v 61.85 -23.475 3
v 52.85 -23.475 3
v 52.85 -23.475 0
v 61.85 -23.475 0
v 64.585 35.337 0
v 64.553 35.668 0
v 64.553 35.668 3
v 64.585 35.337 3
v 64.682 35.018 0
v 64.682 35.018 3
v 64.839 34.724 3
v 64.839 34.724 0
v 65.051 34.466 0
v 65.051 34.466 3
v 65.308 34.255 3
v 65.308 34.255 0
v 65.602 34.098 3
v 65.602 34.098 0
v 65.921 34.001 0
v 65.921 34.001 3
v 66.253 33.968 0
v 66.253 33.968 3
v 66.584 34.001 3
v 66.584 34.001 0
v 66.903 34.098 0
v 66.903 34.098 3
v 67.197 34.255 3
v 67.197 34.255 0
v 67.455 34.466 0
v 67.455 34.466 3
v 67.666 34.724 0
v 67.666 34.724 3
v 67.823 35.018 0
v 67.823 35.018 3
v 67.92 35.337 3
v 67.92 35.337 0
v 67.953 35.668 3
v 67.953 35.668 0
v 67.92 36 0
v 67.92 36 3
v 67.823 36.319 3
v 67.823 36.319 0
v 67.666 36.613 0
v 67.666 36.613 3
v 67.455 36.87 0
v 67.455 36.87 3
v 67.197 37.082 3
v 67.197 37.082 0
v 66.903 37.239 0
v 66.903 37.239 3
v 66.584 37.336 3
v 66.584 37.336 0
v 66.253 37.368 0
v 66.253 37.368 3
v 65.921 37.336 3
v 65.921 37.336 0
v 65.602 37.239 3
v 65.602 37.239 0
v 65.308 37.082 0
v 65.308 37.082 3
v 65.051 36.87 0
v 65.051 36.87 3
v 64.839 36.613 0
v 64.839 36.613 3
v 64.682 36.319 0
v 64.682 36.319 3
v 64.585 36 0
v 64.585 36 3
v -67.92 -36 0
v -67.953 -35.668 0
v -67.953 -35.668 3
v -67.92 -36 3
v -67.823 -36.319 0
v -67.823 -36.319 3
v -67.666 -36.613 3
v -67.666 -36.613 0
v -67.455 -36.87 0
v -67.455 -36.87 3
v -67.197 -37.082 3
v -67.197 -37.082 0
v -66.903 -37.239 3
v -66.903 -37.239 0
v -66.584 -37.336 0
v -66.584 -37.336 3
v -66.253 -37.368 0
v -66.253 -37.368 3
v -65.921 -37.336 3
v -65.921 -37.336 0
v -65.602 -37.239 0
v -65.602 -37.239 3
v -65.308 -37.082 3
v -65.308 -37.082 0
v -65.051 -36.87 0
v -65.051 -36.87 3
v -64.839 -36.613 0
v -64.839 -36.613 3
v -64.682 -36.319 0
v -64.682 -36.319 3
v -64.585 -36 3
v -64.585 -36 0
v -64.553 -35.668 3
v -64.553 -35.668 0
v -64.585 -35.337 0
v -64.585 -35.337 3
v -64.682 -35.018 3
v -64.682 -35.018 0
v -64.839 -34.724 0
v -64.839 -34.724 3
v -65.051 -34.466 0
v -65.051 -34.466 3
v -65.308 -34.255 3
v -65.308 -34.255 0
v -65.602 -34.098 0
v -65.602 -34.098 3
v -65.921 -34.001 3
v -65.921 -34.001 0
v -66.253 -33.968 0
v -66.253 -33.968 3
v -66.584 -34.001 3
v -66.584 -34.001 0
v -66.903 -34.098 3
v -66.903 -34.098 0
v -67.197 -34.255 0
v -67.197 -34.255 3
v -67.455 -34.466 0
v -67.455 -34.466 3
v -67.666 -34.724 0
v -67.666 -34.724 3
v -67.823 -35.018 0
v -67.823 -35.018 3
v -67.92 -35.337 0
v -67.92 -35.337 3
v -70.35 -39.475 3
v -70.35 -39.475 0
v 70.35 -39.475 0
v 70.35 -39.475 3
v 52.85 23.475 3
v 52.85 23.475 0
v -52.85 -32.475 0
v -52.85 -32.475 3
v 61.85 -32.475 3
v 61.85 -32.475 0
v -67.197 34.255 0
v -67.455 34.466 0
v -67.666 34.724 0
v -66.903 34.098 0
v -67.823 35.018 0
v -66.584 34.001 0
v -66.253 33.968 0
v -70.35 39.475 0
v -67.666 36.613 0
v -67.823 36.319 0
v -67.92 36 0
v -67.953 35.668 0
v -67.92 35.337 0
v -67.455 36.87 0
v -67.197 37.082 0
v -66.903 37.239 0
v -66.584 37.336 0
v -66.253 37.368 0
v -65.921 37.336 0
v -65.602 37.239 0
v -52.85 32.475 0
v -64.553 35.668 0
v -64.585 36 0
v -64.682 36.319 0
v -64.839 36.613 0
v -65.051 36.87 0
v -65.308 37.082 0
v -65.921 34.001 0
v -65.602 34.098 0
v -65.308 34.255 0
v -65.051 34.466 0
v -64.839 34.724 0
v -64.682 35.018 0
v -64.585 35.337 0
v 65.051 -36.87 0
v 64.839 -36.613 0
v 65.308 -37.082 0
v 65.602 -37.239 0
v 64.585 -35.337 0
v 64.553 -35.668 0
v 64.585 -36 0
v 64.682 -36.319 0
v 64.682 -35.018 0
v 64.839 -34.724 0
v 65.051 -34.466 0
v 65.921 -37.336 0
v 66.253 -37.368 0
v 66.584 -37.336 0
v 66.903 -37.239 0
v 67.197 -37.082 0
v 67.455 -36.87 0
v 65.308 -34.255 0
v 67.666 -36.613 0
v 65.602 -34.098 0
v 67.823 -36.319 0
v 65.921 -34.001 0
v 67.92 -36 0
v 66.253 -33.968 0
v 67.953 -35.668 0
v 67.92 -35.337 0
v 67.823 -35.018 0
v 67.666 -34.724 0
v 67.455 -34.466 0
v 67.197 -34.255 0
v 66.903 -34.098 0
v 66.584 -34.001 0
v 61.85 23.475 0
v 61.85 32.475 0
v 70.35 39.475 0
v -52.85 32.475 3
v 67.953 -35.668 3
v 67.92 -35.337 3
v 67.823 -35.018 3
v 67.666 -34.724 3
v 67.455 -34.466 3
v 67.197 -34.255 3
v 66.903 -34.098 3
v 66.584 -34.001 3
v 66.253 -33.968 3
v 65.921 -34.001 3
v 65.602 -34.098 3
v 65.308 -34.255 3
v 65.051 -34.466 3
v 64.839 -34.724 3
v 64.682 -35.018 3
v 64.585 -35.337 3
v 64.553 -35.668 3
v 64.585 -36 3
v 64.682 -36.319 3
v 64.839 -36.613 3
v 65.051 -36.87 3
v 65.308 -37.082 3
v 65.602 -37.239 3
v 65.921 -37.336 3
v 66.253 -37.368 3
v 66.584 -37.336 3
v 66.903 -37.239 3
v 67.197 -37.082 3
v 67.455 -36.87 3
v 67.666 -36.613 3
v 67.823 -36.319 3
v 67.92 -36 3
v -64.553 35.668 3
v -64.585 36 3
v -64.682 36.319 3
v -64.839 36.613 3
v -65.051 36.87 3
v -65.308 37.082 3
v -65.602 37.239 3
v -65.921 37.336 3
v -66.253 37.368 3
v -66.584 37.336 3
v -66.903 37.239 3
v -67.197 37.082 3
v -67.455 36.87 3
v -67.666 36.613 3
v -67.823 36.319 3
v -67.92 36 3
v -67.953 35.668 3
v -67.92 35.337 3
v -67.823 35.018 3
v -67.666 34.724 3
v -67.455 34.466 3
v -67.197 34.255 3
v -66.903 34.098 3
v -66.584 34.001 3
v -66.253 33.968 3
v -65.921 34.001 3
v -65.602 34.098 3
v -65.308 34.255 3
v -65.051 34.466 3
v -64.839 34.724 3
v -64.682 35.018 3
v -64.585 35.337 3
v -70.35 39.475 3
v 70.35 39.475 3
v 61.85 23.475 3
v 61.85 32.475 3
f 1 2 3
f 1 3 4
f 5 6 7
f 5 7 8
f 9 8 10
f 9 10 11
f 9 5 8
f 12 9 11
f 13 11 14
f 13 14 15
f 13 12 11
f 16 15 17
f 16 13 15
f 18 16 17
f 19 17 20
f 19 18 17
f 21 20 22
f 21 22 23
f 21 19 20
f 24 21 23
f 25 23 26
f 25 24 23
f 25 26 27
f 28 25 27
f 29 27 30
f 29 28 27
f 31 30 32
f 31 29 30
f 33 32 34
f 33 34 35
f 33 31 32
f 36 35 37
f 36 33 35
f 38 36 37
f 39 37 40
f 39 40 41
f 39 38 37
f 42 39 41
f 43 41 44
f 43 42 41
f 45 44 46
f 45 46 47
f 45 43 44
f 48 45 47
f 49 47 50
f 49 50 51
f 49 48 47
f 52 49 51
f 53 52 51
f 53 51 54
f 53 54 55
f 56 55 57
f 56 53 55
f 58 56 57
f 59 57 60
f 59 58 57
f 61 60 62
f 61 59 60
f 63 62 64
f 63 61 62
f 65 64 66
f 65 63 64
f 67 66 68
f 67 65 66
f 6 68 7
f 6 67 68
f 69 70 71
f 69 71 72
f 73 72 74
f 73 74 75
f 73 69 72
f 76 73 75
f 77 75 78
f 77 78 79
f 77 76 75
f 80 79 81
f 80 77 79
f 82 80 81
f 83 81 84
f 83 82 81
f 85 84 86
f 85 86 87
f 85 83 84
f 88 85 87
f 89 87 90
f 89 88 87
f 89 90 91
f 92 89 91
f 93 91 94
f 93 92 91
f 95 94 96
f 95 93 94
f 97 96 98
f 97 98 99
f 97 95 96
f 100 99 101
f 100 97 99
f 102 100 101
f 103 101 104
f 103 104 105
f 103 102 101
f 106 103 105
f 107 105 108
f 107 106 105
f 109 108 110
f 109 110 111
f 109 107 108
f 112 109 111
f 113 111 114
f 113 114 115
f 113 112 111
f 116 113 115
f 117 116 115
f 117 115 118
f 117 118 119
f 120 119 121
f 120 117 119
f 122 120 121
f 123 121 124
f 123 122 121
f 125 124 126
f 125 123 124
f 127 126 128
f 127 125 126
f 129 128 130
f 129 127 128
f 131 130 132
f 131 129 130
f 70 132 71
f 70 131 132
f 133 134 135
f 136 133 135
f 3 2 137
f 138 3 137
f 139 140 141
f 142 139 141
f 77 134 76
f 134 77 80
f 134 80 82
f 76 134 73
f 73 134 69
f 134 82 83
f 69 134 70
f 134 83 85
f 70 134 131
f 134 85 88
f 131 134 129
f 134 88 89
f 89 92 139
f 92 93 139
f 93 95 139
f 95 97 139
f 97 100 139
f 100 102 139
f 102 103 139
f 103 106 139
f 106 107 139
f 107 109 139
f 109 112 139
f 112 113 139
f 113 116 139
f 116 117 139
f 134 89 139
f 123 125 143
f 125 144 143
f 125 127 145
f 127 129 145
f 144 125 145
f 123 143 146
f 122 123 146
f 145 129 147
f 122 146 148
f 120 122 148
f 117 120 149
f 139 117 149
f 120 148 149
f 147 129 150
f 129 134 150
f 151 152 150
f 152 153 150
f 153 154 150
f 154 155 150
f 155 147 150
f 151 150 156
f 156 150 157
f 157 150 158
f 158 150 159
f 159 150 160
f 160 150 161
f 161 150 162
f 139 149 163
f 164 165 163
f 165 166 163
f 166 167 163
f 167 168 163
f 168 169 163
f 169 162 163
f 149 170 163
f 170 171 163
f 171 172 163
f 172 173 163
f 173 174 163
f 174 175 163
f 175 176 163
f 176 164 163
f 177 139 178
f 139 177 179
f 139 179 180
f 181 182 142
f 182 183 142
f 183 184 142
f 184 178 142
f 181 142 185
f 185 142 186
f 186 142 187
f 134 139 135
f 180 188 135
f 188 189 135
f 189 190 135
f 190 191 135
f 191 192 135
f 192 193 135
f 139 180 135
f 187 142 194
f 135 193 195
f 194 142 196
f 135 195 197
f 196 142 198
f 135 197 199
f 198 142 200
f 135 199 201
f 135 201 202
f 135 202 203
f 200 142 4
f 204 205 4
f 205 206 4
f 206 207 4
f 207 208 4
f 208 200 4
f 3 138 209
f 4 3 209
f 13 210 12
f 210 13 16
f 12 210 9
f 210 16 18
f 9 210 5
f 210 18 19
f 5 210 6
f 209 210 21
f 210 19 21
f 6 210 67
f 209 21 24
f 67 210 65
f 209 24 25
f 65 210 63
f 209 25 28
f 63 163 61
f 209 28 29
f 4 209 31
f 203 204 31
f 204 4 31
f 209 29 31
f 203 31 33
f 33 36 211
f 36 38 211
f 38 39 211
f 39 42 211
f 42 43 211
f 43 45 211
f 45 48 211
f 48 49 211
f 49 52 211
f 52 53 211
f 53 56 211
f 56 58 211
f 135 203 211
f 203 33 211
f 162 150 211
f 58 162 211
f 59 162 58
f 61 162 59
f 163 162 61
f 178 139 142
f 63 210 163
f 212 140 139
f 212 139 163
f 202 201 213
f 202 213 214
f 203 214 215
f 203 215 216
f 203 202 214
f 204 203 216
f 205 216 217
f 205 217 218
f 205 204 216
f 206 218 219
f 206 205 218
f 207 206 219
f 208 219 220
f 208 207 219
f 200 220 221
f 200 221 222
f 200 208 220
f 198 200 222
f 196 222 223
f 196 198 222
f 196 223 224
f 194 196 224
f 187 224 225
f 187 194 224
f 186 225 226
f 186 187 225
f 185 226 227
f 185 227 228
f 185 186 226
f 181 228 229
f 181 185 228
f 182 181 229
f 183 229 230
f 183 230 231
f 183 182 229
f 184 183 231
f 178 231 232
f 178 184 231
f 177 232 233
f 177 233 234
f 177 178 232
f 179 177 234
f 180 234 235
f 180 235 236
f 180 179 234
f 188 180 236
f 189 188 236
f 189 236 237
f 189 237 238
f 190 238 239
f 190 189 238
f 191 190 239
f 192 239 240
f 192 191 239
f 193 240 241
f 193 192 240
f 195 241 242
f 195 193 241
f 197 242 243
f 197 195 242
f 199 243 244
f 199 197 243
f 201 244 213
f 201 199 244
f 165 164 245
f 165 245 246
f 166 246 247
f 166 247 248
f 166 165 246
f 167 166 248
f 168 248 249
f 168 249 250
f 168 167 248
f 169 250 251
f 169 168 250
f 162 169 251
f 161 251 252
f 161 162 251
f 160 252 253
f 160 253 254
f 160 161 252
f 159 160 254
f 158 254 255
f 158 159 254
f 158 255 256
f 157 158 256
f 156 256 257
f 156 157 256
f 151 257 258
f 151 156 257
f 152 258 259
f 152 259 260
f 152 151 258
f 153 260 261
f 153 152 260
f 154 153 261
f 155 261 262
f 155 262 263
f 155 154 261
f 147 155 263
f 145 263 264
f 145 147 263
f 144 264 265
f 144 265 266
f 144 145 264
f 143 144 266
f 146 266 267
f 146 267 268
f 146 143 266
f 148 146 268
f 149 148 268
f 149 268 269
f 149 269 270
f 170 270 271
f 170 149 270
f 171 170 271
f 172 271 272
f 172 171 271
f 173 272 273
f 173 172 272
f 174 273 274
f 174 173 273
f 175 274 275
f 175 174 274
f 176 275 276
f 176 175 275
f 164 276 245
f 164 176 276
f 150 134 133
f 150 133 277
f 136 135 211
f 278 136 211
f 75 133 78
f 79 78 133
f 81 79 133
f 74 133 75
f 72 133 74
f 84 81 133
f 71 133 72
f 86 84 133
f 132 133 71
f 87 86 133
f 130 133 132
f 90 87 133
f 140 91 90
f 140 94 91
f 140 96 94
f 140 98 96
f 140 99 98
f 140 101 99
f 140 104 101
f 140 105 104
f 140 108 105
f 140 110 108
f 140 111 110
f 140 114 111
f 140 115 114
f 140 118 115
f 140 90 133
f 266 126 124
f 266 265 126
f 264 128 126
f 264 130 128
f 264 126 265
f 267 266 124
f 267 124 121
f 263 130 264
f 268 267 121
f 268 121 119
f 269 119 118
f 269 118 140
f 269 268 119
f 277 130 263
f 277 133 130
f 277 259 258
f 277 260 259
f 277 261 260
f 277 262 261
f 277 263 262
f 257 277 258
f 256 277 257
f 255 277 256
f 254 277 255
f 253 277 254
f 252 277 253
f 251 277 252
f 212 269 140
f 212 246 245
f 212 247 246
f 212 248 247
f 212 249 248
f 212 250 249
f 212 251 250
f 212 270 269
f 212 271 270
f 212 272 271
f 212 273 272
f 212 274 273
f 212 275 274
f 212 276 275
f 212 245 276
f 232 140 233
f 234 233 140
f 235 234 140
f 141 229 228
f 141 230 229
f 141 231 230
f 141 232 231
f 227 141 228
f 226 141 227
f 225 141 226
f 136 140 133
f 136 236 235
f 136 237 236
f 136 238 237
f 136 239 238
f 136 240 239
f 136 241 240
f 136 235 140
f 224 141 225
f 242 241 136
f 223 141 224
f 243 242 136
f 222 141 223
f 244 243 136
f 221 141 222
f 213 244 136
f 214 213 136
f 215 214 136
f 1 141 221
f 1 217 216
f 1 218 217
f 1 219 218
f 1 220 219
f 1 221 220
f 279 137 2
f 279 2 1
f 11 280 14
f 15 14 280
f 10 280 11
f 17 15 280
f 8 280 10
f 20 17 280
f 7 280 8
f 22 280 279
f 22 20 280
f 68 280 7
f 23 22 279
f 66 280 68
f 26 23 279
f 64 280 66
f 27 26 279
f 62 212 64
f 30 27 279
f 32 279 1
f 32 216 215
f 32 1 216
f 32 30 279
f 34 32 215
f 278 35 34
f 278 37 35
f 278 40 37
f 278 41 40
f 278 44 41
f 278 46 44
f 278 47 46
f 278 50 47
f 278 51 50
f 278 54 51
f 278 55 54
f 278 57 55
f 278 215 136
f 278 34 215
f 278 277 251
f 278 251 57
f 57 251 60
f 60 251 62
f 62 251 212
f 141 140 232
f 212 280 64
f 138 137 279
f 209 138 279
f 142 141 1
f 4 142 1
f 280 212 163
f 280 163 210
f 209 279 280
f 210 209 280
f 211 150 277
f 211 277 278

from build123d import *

# Parameters (mm, degrees)
SKETCH_1_W          = 140.7
SKETCH_1_H          = 78.95
SKETCH_1_R          = 1.7
EXTRUDE_1_DEPTH     = 3
SKETCH_2_W          = 105.7
SKETCH_2_H          = 64.95
CUT_EXTRUDE_1_DEPTH = 81.724210278
SKETCH_3_W          = 9
SKETCH_3_H          = 9
CUT_EXTRUDE_2_DEPTH = 81.724210278


with BuildPart() as part:
    # 草图1 → 凸台-拉伸1 (new body)
    with BuildSketch(Plane.XY):
        Rectangle(SKETCH_1_W, SKETCH_1_H)
        with Locations((-66.25272379, 35.66826865)):
            Circle(SKETCH_1_R, mode=Mode.SUBTRACT)
        with Locations(Location((66.25272379, 35.66826865, 0), (0, 0, 180))):
            Circle(SKETCH_1_R, mode=Mode.SUBTRACT)
        with Locations((66.25272379, -35.66826865)):
            Circle(SKETCH_1_R, mode=Mode.SUBTRACT)
        with Locations(Location((-66.25272379, -35.66826865, 0), (0, 0, 180))):
            Circle(SKETCH_1_R, mode=Mode.SUBTRACT)
    extrude(amount=EXTRUDE_1_DEPTH)

    # 草图2 → 切除-拉伸1 (cut, through all)
    with BuildSketch(Plane.XY.offset(3)):
        Rectangle(SKETCH_2_W, SKETCH_2_H)
    extrude(amount=-CUT_EXTRUDE_1_DEPTH, mode=Mode.SUBTRACT)

    # 草图3 → 切除-拉伸2 (cut, through all)
    with BuildSketch(Plane.XY.offset(3)):
        with Locations((57.35, 27.975)):
            Rectangle(SKETCH_3_W, SKETCH_3_H)
        with Locations((57.35, -27.975)):
            Rectangle(SKETCH_3_W, SKETCH_3_H)
    extrude(amount=-CUT_EXTRUDE_2_DEPTH, mode=Mode.SUBTRACT)


solid = part.part
